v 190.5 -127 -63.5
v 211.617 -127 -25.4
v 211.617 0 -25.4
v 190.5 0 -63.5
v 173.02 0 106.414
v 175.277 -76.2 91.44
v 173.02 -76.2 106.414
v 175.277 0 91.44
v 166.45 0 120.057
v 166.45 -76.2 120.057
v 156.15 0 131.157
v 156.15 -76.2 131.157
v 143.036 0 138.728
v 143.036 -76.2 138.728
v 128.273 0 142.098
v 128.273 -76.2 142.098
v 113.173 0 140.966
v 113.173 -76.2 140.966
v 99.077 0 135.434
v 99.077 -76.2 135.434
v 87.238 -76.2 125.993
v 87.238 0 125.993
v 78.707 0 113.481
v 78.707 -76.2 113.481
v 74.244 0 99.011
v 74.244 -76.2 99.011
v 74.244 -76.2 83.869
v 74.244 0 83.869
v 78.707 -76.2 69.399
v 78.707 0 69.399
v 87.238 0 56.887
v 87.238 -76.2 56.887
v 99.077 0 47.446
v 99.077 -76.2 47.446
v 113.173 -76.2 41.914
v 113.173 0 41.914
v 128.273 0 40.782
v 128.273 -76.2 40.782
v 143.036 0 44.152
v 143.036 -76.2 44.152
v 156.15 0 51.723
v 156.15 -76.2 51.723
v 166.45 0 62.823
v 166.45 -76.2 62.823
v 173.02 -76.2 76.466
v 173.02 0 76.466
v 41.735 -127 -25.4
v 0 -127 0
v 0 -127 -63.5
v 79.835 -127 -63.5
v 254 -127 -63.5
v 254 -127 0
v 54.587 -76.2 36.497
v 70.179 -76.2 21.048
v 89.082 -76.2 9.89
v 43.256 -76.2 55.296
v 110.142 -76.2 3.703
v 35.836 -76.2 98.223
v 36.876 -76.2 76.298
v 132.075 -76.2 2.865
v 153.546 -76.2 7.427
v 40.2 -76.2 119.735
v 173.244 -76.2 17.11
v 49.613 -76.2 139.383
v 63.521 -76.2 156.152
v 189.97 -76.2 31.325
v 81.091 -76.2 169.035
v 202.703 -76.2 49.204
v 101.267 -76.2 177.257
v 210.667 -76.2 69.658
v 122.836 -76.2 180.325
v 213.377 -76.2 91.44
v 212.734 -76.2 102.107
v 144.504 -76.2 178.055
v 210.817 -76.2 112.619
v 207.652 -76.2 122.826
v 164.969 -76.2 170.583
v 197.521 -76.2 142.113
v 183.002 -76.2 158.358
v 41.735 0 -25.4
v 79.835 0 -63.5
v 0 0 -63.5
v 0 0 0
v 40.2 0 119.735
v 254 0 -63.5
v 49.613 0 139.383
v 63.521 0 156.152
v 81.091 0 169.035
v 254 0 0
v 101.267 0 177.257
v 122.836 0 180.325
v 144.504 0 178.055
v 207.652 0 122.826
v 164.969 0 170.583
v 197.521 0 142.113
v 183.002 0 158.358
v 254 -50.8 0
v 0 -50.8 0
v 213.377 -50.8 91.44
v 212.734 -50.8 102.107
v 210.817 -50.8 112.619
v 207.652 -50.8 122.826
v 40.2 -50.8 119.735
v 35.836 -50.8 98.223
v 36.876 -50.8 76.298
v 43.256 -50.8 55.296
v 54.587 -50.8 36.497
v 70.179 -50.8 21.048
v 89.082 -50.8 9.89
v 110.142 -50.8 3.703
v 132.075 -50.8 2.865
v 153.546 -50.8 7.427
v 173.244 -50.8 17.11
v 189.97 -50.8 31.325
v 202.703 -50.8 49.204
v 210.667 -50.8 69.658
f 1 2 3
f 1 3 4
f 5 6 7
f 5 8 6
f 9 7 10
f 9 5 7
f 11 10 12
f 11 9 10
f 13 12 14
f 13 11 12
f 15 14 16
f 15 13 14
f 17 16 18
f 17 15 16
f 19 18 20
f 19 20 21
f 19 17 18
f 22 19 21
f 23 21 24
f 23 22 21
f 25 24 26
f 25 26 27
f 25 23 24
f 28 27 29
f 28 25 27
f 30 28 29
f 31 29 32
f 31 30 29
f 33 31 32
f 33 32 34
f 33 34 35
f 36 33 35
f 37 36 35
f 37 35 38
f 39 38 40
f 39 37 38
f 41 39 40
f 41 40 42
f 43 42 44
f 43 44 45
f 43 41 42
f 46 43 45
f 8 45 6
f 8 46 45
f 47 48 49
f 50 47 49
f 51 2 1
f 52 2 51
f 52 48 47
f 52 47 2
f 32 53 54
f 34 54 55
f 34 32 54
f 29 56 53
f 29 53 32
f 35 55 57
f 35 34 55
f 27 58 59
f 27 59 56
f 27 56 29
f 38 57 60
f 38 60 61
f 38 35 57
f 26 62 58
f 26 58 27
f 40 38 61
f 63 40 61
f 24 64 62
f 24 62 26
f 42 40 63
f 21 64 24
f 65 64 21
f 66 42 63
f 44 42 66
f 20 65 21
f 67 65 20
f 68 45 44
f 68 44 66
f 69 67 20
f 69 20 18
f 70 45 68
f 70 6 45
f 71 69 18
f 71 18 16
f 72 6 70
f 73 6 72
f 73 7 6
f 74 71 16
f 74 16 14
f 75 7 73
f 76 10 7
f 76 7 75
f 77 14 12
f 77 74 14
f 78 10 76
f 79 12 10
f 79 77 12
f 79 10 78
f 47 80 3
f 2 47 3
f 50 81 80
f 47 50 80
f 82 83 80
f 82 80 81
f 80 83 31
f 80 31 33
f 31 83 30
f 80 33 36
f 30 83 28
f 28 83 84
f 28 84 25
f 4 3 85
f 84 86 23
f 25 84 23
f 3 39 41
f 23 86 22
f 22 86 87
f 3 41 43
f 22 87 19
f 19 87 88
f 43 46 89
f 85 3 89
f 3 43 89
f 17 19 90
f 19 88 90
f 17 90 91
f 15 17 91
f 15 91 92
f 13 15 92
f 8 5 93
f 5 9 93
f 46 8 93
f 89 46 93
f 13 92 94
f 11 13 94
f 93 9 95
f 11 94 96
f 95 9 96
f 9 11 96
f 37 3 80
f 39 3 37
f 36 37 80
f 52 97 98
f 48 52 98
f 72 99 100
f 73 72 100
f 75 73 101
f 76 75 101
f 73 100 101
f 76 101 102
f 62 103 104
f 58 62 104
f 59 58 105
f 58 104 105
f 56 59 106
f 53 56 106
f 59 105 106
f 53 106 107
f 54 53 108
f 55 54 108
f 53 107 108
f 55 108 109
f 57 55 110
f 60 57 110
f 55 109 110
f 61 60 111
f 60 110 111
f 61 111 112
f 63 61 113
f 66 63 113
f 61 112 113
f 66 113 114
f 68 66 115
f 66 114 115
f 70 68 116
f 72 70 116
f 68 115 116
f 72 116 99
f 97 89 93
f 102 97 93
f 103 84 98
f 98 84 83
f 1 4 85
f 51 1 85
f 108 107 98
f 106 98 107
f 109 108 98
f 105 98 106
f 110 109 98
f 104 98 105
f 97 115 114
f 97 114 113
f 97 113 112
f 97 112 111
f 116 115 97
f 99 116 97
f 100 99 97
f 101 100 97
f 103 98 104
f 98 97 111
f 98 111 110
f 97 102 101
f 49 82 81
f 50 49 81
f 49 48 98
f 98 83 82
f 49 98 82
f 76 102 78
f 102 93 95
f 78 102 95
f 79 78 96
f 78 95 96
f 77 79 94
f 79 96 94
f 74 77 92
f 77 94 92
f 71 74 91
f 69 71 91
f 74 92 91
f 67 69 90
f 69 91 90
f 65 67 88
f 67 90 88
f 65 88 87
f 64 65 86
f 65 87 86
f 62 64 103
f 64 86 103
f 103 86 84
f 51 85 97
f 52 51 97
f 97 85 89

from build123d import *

# Parameters (mm, degrees)
F1_DEPTH = 127
F2_DEPTH = 50.8
F0_R     = 50.8
F3_DEPTH = 25.4
F4_DEPTH = 50.8


with BuildPart() as f1:
    # F0 (on Front) → F1 (new body)
    with BuildSketch(Plane.XZ):
        Polygon((254, 0), (0, 0), (0, -63.5), (79.8352242538, -63.5), (41.7352242538, -25.4), (211.6168698438, -25.4), (190.5, -63.5), (254, -63.5), align=None)
    extrude(amount=F1_DEPTH)

    # F0 (on Front) → F2 (join)
    with BuildSketch(Plane.XZ):
        with BuildLine():
            Line((40.1998028961, 119.7350906188), (0, 0))
            Line((0, 0), (254, 0))
            Line((254, 0), (207.6520293862, 122.8259365118))
            ThreePointArc((207.6520293862, 122.8259365118), (211.9338340509, 107.391873178), (213.3767146031, 91.44))
            ThreePointArc((213.3767146031, 91.44), (110.1415733543, 3.7033843519), (40.1998028961, 119.7350906188))
        make_face()
    extrude(amount=F2_DEPTH)

    # F0 (on Front) → F3 (join)
    with BuildSketch(Plane.XZ):
        with BuildLine():
            ThreePointArc((207.6520293862, 122.8259365118), (122.8360711229, 180.3248597286), (40.1998028961, 119.7350906188))
            ThreePointArc((40.1998028961, 119.7350906188), (110.1415733543, 3.7033843519), (213.3767146031, 91.44))
            ThreePointArc((213.3767146031, 91.44), (211.9338340509, 107.391873178), (207.6520293862, 122.8259365118))
        make_face()
        with Locations((124.4767146031, 91.44)):
            Circle(F0_R, mode=Mode.SUBTRACT)
    extrude(amount=F3_DEPTH)

    # F4 (add): a face of the model
    f4_faces = [f1.faces().sort_by_distance(p)[0] for p in [
        (122.8824755281, -25.4, 177.8108162462),
    ]]
    extrude(f4_faces, amount=F4_DEPTH)


solid = f1.part
